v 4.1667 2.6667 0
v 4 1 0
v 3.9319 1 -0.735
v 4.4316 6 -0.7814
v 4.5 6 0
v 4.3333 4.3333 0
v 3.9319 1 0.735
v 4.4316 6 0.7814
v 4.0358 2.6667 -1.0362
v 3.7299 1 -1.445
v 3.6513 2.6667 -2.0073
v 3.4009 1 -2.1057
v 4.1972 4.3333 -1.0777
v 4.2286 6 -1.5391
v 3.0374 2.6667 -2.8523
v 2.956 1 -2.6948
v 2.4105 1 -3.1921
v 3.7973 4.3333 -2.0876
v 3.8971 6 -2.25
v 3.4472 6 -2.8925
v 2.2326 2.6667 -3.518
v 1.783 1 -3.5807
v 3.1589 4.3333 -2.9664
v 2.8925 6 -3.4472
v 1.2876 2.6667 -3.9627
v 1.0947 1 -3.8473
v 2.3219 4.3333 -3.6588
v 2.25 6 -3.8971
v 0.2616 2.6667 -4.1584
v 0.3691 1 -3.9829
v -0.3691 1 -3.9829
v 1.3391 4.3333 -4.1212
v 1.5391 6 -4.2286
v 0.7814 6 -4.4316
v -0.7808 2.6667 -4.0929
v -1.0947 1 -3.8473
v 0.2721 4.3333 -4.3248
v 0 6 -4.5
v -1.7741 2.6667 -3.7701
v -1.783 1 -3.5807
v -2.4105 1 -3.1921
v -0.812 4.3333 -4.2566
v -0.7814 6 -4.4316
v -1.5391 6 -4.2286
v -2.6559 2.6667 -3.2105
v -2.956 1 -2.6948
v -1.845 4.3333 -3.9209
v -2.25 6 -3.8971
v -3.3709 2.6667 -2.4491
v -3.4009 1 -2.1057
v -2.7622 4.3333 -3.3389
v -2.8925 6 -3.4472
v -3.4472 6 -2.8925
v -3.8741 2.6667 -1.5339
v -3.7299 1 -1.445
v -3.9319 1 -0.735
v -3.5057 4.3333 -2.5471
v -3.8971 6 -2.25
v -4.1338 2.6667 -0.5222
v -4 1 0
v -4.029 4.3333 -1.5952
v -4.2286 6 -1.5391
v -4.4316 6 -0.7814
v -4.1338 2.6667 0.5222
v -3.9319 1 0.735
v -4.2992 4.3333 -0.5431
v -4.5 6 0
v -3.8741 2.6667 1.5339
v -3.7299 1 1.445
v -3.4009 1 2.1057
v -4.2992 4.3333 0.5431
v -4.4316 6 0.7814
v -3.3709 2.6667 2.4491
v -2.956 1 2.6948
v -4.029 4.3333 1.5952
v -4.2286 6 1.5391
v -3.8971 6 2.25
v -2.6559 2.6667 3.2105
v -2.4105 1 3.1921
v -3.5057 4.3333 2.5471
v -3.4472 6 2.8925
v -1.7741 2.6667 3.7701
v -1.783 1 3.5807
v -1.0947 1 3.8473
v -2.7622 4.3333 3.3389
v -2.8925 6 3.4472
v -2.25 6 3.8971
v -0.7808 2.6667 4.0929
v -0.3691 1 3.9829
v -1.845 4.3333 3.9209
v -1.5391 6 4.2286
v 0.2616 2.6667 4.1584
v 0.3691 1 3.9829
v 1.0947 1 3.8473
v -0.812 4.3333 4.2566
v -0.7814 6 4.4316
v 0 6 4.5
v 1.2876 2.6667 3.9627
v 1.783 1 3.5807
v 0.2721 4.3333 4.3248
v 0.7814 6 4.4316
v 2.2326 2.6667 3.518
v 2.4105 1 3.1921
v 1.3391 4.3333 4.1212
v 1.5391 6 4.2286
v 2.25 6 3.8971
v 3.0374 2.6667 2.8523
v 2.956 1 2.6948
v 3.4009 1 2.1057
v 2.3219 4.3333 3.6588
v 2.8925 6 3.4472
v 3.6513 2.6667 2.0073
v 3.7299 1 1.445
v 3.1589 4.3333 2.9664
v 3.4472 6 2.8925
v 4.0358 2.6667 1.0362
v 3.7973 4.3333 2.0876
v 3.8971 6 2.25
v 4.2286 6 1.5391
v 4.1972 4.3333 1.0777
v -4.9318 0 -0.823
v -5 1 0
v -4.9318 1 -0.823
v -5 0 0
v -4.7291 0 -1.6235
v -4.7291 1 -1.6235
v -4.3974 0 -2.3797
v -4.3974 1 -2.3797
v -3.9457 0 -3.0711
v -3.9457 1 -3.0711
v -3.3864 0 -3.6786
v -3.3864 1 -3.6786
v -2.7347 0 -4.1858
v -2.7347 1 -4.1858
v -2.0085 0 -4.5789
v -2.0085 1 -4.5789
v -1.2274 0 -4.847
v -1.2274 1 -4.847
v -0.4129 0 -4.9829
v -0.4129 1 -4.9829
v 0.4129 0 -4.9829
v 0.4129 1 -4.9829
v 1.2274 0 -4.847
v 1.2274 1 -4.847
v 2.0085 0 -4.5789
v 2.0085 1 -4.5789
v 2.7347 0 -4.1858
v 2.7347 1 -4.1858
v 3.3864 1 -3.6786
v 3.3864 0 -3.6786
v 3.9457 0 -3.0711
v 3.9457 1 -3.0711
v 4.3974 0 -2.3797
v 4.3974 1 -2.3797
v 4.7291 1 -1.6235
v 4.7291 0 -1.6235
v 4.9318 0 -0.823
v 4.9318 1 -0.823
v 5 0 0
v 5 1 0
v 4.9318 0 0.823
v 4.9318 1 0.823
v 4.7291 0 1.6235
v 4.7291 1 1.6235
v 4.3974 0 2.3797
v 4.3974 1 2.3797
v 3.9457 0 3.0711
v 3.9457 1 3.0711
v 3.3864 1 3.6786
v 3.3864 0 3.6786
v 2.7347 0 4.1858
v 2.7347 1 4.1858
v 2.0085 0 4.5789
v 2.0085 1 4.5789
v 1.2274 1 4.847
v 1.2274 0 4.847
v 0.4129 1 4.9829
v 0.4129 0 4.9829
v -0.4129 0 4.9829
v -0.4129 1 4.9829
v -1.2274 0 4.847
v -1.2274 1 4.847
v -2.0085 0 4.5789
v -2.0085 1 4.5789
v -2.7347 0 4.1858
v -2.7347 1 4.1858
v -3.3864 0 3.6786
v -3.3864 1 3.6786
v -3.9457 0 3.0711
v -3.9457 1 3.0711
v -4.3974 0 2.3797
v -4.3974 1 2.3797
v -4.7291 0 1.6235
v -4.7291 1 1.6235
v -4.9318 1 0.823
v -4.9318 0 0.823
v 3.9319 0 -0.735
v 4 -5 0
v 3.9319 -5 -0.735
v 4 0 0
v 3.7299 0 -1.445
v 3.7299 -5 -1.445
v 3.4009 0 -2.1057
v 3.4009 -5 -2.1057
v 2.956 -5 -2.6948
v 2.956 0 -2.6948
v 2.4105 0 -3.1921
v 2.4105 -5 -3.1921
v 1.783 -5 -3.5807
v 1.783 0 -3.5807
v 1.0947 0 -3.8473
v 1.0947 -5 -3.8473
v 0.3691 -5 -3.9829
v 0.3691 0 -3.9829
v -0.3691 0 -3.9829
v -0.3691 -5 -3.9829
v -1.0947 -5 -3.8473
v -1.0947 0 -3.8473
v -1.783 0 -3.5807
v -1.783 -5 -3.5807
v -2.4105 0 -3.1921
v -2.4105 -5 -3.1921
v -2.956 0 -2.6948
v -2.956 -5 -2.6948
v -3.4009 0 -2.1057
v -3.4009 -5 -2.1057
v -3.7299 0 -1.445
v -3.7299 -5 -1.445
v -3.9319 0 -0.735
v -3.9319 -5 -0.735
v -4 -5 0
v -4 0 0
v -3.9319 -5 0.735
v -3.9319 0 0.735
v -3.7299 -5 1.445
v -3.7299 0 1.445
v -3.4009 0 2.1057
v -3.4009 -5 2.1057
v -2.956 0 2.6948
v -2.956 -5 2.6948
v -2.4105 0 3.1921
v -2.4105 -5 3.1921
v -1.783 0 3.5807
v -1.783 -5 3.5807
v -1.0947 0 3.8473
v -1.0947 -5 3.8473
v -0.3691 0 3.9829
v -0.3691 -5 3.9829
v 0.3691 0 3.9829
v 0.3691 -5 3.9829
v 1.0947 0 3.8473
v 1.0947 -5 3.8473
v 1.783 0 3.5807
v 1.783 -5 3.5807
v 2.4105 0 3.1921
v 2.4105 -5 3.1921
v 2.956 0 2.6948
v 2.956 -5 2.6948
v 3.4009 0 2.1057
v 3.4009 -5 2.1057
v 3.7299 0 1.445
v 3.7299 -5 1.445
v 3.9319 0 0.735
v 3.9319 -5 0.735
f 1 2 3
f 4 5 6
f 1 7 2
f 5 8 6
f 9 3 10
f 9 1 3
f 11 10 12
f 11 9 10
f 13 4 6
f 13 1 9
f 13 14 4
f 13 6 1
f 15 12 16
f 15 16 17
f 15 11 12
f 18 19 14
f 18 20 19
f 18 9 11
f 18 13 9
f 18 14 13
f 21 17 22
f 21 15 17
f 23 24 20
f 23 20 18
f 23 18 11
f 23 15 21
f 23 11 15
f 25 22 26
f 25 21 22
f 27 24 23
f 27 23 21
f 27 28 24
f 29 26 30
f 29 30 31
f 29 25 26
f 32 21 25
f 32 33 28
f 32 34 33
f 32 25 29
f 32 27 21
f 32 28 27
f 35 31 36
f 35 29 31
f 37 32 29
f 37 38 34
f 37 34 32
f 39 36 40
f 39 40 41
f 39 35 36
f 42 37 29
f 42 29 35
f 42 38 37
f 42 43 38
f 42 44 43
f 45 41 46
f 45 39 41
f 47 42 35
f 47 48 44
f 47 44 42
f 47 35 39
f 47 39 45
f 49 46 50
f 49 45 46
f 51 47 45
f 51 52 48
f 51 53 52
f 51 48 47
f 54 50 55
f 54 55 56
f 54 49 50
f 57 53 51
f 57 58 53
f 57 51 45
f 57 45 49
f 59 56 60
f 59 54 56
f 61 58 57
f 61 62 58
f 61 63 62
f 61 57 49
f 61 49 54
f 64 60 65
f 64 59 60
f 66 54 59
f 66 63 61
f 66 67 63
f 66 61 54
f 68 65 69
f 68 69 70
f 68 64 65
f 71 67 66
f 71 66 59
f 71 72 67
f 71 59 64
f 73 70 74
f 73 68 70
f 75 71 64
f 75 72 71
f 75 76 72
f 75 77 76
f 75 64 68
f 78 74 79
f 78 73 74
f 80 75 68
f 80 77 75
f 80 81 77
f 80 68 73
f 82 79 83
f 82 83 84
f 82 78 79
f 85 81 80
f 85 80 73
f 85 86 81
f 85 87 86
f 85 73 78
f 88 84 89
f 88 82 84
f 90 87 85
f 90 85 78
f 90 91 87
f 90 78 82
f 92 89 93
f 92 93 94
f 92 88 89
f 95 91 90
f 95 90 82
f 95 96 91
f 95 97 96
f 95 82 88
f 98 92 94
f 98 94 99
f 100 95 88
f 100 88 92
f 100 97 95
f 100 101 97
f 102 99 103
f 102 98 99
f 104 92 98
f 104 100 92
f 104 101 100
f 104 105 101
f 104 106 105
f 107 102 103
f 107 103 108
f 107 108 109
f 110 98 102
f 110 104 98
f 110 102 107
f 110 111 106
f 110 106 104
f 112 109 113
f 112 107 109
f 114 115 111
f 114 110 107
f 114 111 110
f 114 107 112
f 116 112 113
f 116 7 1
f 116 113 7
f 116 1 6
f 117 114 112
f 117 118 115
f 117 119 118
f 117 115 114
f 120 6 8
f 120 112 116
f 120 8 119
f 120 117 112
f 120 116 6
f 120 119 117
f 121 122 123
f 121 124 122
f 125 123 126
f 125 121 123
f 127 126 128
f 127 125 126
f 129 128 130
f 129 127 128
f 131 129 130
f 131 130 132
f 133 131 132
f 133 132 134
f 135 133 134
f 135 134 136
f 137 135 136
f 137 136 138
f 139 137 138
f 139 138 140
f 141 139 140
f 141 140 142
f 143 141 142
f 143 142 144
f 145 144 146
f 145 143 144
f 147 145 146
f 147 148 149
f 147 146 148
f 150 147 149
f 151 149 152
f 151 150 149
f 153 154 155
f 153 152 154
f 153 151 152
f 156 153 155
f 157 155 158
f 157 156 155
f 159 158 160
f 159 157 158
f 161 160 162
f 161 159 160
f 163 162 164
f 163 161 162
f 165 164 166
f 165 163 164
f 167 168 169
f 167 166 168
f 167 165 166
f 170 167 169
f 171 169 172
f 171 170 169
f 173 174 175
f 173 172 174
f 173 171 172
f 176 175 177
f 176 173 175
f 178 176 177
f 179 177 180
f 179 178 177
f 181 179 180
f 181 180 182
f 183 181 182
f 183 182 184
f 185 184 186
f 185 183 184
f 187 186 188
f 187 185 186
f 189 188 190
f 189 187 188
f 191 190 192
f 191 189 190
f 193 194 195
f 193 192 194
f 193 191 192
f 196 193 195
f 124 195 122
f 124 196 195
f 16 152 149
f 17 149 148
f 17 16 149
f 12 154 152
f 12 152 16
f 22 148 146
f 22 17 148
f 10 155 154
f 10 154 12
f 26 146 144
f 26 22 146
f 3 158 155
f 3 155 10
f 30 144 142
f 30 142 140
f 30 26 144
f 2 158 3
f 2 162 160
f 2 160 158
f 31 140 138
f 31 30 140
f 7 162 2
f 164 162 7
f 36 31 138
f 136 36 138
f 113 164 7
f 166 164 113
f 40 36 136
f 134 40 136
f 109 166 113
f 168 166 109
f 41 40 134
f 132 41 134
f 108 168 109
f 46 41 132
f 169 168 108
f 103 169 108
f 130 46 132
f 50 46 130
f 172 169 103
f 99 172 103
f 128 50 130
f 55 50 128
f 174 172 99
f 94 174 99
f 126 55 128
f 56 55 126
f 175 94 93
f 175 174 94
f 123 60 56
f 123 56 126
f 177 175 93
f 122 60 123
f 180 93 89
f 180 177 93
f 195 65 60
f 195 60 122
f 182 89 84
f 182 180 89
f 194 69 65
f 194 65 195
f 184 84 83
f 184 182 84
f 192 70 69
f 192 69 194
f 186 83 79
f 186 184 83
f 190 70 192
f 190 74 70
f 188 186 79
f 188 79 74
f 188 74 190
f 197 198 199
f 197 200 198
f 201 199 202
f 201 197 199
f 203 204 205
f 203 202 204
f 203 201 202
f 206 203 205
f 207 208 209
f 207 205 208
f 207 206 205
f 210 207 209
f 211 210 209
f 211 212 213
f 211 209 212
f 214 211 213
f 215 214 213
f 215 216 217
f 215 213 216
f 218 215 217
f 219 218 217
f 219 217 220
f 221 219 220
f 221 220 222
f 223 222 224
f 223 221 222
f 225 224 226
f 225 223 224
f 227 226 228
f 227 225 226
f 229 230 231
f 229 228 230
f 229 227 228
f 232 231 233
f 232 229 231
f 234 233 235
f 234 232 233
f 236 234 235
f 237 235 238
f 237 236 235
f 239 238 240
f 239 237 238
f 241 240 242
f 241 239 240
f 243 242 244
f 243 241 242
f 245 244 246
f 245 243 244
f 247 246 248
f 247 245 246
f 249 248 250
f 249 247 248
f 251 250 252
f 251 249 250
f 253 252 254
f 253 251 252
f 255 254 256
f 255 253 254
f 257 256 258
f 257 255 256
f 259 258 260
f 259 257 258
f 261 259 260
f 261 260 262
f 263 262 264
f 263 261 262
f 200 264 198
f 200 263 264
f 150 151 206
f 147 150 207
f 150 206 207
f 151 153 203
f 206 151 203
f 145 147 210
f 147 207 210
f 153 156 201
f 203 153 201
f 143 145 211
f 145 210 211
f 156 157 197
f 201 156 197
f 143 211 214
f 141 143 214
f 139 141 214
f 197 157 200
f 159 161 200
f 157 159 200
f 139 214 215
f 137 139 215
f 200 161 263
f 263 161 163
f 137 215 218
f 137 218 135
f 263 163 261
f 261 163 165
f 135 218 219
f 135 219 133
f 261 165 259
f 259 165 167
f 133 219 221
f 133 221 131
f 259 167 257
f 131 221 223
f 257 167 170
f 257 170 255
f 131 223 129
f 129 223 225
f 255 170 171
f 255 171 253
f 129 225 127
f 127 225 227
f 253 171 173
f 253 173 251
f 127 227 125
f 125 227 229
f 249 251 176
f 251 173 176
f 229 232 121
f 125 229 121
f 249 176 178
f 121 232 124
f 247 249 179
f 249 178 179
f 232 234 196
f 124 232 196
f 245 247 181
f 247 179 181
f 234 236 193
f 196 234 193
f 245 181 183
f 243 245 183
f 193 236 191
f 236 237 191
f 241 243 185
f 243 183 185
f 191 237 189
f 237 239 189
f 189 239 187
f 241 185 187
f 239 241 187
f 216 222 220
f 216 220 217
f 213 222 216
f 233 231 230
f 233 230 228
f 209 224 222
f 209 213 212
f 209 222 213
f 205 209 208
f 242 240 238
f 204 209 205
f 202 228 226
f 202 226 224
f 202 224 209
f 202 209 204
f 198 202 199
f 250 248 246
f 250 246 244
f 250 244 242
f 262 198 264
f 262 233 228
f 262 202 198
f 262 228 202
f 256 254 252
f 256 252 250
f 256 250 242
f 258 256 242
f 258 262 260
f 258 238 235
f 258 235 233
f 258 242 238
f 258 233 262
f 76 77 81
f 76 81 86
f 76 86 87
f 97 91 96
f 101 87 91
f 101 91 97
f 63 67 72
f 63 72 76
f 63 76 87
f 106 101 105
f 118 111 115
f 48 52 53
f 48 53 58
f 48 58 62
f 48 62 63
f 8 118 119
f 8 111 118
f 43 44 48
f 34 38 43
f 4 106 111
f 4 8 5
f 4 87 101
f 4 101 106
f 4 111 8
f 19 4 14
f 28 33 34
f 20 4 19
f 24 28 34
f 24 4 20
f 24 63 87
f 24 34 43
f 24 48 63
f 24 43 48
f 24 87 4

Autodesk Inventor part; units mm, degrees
ref_plane "YZ Plane" through (0, 0, 0) normal (1, 0, 0) x (0, 1, 0)
ref_plane "XZ Plane" through (0, 0, 0) normal (0, 1, 0) x (-1, 0, 0)
sketch "草图1" plane through (0, 0, 0) normal (0, 1, 0) x (-1, 0, 0)
  circle A0 centre (0, 0) radius 5
  dimension "d0" = 10
extrude "拉伸1" add sketch "草图1" along normal blind 1
sketch "草图2" plane through (0, 1, 0) normal (0, 1, 0) x (1, 0, 0)
  circle A0 centre (0, 0) radius 4
  dimension "d3" = 8
ref_plane "工作平面1" through (0, 6, 0) normal (0, 1, 0) x (1, 0, 0)
sketch "草图3" plane through (0, 6, 0) normal (0, 1, 0) x (1, 0, 0)
  circle A0 centre (0, 0) radius 4.5
  dimension "d5" = 9
loft "放样1" add profiles "草图2", "草图3"
sketch "草图4" plane through (0, 0, 0) normal (0, -1, 0) x (1, 0, 0)
  circle A0 centre (0, 0) radius 4
  dimension "d11" = 8
extrude "拉伸2" add sketch "草图4" along normal blind 5
properties part number "backtop"
